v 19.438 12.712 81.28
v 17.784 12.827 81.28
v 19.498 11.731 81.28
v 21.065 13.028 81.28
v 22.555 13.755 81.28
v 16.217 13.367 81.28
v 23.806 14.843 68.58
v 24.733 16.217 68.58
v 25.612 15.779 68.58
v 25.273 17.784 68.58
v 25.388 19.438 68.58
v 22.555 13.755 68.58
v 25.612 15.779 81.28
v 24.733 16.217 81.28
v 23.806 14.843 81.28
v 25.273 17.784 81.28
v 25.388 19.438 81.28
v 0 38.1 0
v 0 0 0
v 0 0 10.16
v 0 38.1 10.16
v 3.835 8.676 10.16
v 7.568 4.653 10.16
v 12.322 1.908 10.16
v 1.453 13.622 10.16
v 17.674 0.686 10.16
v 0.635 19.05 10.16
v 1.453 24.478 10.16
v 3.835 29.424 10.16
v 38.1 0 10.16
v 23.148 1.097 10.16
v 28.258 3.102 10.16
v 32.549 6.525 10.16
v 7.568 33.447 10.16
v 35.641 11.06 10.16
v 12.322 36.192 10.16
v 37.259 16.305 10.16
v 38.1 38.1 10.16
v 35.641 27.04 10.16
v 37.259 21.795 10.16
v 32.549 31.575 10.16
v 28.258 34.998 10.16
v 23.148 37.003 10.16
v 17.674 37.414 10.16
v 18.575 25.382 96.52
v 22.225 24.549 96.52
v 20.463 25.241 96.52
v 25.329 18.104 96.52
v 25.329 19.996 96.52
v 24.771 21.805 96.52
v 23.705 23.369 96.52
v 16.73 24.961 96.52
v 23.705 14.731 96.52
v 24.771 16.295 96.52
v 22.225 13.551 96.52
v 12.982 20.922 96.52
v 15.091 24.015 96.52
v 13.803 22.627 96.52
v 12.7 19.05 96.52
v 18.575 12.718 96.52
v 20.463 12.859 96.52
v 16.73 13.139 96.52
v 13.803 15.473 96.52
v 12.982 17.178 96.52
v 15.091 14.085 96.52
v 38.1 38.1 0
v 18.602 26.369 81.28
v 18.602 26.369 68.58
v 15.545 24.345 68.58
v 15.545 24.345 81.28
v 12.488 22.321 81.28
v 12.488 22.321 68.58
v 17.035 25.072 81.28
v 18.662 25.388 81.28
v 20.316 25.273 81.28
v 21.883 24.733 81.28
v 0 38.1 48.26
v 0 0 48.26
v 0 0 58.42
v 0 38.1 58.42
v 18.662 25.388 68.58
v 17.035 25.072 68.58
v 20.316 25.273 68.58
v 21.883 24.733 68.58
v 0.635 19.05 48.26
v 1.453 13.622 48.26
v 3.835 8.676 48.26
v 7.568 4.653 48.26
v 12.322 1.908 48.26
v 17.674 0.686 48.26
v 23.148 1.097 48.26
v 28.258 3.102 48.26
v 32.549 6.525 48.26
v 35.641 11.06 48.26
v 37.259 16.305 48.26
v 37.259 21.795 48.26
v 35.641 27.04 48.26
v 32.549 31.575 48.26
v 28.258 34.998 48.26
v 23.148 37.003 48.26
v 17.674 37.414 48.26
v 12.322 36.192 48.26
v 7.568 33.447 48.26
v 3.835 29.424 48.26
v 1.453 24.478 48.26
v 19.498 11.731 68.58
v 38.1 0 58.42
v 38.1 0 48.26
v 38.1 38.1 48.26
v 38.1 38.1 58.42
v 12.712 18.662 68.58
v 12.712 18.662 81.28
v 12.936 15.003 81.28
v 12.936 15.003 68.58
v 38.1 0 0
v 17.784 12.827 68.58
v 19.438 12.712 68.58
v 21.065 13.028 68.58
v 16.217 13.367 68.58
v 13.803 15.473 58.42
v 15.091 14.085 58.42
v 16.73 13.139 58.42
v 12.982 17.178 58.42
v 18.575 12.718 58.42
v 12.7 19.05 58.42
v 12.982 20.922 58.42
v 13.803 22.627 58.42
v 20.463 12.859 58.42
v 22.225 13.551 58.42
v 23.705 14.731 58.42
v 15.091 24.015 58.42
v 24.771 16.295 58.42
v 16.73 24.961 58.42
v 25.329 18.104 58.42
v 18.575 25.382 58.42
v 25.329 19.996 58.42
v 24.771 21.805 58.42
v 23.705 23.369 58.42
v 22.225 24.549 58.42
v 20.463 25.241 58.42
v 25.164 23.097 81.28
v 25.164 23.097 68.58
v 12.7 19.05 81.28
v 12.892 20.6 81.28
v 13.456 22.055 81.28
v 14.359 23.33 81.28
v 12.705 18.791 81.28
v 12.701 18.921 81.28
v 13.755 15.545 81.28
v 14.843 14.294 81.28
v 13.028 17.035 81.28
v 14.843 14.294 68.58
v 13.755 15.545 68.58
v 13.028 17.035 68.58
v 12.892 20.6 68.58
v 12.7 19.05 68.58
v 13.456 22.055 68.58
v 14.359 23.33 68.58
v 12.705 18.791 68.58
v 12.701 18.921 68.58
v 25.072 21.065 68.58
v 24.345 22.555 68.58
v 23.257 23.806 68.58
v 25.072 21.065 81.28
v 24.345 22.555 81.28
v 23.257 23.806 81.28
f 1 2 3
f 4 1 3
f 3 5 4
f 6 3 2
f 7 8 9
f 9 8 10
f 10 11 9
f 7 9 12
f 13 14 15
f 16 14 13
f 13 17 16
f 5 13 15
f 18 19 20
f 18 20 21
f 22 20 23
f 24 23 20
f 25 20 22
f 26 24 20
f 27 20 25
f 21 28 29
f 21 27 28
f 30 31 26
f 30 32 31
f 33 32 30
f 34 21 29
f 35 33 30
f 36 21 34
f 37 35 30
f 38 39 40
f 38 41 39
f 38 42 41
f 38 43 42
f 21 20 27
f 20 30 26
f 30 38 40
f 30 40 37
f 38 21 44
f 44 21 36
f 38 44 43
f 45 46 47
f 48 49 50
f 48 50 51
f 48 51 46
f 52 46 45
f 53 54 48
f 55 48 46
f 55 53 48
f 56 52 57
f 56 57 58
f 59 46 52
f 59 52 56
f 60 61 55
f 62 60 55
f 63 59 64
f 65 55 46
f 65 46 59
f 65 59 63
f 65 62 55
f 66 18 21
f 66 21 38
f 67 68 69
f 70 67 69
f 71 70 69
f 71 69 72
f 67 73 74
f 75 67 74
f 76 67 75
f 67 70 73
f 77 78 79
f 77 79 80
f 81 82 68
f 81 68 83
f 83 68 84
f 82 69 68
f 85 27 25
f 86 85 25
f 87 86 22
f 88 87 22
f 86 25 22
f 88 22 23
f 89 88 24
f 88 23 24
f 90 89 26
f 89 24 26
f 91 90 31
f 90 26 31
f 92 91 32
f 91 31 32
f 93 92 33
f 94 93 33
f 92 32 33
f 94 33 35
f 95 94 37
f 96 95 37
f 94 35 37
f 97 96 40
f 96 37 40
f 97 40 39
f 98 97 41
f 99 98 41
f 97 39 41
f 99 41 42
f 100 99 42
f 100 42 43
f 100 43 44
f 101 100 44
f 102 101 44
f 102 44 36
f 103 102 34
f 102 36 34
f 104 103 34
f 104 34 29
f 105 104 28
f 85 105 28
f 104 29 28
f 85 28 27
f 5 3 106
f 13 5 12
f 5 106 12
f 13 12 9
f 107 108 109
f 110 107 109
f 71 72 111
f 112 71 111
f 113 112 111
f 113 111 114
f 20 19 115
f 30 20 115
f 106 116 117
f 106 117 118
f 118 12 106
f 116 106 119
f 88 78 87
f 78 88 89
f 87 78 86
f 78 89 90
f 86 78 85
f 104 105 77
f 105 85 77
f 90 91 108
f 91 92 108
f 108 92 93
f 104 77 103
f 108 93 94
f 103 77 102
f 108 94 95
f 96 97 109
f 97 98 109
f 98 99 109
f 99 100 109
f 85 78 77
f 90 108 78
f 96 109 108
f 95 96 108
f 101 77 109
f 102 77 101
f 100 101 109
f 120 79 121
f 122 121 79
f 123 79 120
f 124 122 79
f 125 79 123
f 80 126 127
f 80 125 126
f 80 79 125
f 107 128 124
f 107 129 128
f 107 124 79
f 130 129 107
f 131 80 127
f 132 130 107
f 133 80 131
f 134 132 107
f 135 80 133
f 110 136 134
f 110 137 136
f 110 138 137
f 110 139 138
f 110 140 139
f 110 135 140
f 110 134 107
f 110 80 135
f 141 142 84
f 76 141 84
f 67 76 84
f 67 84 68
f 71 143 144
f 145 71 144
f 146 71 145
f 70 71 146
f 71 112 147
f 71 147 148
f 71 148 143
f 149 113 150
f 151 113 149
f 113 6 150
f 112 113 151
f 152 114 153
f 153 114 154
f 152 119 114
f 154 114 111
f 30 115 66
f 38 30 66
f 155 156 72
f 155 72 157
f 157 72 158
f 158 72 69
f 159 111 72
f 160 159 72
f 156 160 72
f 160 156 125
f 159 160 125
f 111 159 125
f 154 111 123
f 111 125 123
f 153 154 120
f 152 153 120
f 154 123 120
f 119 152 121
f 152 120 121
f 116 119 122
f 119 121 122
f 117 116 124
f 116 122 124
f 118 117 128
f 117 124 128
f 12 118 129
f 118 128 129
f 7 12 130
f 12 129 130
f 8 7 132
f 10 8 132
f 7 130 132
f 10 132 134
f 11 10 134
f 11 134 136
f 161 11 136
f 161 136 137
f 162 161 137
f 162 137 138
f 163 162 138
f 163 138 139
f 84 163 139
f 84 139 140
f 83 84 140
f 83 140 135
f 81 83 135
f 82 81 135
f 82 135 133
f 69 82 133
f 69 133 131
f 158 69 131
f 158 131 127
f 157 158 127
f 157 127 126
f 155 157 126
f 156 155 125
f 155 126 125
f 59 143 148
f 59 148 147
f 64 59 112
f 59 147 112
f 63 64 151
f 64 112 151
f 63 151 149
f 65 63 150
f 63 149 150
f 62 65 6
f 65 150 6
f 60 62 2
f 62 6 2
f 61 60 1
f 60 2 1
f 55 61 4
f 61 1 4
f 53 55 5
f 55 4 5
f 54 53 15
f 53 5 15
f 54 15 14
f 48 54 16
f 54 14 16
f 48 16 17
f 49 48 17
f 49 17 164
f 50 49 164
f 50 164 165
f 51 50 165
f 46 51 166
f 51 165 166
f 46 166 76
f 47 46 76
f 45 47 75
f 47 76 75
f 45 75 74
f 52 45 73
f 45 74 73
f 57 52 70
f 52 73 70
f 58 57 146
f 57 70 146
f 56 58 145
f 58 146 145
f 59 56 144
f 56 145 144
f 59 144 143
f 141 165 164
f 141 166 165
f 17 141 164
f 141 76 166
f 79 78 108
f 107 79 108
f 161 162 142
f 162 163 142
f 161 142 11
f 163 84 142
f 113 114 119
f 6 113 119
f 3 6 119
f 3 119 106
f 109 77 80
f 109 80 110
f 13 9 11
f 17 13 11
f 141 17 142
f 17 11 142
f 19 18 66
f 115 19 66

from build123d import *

# Parameters (mm, degrees)
SKETCH1_W           = 38.1
SKETCH1_H           = 38.1
BOSS_EXTRUDE1_DEPTH = 10.16
SKETCH2_R           = 18.415
BOSS_EXTRUDE2_DEPTH = 38.1
SKETCH3_W           = 38.1
SKETCH3_H           = 38.1
BOSS_EXTRUDE3_DEPTH = 10.16
SKETCH4_R           = 6.35
BOSS_EXTRUDE4_DEPTH = 10.16
BOSS_EXTRUDE5_DEPTH = 12.7
SKETCH6_R           = 6.35
BOSS_EXTRUDE6_DEPTH = 15.24


with BuildPart() as part:
    # Sketch1 → Boss-Extrude1 (new body)
    with BuildSketch(Plane.XY):
        with Locations((19.05, 19.05)):
            Rectangle(SKETCH1_W, SKETCH1_H)
    extrude(amount=BOSS_EXTRUDE1_DEPTH)

    # Sketch2 → Boss-Extrude2 (add)
    with BuildSketch(Plane.XY.offset(10.16)):
        with Locations(Location((19.05, 19.05, 0), (0, 0, 180))):
            Circle(SKETCH2_R)
    extrude(amount=BOSS_EXTRUDE2_DEPTH)

    # Sketch3 → Boss-Extrude3 (add)
    with BuildSketch(Plane.XY.offset(48.26)):
        with Locations((19.05, 19.05)):
            Rectangle(SKETCH3_W, SKETCH3_H)
    extrude(amount=BOSS_EXTRUDE3_DEPTH)

    # Sketch4 → Boss-Extrude4 (add)
    with BuildSketch(Plane.XY.offset(58.42)):
        with Locations(Location((19.05, 19.05, 0), (0, 0, 180))):
            Circle(SKETCH4_R)
    extrude(amount=BOSS_EXTRUDE4_DEPTH)

    # Sketch5 → Boss-Extrude5 (add)
    with BuildSketch(Plane.XY.offset(68.58)):
        Polygon((25.164098612, 23.097361053), (18.601931816, 26.368645246), (12.487833204, 22.321284193), (12.935901388, 15.002638947), (19.498068184, 11.731354754), (25.612166796, 15.778715807), align=None)
    extrude(amount=BOSS_EXTRUDE5_DEPTH)

    # Sketch6 → Boss-Extrude6 (add)
    with BuildSketch(Plane.XY.offset(81.28)):
        with Locations(Location((19.05, 19.05, 0), (0, 0, 180))):
            Circle(SKETCH6_R)
    extrude(amount=BOSS_EXTRUDE6_DEPTH)


solid = part.part
